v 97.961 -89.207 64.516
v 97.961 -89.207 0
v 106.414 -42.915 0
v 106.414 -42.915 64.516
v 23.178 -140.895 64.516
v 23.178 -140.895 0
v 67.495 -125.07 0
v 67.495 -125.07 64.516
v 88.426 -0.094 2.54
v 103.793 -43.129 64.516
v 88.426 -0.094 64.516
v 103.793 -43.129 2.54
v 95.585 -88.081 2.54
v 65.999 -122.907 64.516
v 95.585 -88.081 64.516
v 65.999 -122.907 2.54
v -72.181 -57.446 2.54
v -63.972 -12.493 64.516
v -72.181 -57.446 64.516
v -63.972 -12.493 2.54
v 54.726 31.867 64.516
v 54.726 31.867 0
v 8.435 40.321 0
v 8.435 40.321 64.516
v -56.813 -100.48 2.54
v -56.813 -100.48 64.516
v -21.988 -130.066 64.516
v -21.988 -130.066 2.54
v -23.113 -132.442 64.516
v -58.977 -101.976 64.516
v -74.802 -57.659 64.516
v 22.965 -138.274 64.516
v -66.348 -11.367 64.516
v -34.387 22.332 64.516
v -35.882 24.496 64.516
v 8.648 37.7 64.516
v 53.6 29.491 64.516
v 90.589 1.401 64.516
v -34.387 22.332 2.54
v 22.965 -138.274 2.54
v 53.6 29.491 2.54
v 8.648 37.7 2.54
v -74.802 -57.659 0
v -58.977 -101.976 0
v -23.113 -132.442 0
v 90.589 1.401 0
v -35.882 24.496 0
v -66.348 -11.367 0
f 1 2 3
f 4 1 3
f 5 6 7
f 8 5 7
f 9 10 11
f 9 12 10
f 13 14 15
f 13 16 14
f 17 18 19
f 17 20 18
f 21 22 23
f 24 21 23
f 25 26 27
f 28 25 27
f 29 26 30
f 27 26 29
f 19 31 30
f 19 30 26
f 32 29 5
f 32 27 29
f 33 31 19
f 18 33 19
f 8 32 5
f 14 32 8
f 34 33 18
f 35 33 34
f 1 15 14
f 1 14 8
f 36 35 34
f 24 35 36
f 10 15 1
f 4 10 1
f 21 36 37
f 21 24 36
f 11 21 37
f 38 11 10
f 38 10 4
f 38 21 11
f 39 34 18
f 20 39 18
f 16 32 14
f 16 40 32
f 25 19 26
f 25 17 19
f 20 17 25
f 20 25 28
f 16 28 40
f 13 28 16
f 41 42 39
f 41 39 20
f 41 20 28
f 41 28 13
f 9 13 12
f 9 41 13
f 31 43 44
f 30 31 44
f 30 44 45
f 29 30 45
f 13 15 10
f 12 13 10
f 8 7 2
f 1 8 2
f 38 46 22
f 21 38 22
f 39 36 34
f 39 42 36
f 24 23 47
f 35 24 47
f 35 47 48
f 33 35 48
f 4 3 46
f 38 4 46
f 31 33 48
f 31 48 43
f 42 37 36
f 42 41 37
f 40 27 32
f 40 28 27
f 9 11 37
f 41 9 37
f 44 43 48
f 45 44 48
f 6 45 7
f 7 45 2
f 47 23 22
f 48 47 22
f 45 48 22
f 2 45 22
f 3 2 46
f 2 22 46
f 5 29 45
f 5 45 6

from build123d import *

# Parameters (mm, degrees)
F1_DEPTH = 64.516
F2_T     = -2.54


with BuildPart() as f1:
    # F0 (on Top) → F1 (new body)
    with BuildSketch(Plane.XY):
        Polygon((8.434549, 40.320739), (-35.881834, 24.495647), (-66.348401, -11.367476), (-74.801661, -57.659135), (-58.976569, -101.975517), (-23.113446, -132.442084), (23.178213, -140.895344), (67.494595, -125.070252), (97.961162, -89.207129), (106.414422, -42.915471), (90.58933, 1.400912), (54.726207, 31.867479), align=None)
    extrude(amount=F1_DEPTH)

    # F2
    f2_openings = [f1.faces().sort_by_distance(p)[0] for p in [
        (15.806381, -50.287303, 64.516),
    ]]
    offset(amount=F2_T, openings=f2_openings)


solid = f1.part
